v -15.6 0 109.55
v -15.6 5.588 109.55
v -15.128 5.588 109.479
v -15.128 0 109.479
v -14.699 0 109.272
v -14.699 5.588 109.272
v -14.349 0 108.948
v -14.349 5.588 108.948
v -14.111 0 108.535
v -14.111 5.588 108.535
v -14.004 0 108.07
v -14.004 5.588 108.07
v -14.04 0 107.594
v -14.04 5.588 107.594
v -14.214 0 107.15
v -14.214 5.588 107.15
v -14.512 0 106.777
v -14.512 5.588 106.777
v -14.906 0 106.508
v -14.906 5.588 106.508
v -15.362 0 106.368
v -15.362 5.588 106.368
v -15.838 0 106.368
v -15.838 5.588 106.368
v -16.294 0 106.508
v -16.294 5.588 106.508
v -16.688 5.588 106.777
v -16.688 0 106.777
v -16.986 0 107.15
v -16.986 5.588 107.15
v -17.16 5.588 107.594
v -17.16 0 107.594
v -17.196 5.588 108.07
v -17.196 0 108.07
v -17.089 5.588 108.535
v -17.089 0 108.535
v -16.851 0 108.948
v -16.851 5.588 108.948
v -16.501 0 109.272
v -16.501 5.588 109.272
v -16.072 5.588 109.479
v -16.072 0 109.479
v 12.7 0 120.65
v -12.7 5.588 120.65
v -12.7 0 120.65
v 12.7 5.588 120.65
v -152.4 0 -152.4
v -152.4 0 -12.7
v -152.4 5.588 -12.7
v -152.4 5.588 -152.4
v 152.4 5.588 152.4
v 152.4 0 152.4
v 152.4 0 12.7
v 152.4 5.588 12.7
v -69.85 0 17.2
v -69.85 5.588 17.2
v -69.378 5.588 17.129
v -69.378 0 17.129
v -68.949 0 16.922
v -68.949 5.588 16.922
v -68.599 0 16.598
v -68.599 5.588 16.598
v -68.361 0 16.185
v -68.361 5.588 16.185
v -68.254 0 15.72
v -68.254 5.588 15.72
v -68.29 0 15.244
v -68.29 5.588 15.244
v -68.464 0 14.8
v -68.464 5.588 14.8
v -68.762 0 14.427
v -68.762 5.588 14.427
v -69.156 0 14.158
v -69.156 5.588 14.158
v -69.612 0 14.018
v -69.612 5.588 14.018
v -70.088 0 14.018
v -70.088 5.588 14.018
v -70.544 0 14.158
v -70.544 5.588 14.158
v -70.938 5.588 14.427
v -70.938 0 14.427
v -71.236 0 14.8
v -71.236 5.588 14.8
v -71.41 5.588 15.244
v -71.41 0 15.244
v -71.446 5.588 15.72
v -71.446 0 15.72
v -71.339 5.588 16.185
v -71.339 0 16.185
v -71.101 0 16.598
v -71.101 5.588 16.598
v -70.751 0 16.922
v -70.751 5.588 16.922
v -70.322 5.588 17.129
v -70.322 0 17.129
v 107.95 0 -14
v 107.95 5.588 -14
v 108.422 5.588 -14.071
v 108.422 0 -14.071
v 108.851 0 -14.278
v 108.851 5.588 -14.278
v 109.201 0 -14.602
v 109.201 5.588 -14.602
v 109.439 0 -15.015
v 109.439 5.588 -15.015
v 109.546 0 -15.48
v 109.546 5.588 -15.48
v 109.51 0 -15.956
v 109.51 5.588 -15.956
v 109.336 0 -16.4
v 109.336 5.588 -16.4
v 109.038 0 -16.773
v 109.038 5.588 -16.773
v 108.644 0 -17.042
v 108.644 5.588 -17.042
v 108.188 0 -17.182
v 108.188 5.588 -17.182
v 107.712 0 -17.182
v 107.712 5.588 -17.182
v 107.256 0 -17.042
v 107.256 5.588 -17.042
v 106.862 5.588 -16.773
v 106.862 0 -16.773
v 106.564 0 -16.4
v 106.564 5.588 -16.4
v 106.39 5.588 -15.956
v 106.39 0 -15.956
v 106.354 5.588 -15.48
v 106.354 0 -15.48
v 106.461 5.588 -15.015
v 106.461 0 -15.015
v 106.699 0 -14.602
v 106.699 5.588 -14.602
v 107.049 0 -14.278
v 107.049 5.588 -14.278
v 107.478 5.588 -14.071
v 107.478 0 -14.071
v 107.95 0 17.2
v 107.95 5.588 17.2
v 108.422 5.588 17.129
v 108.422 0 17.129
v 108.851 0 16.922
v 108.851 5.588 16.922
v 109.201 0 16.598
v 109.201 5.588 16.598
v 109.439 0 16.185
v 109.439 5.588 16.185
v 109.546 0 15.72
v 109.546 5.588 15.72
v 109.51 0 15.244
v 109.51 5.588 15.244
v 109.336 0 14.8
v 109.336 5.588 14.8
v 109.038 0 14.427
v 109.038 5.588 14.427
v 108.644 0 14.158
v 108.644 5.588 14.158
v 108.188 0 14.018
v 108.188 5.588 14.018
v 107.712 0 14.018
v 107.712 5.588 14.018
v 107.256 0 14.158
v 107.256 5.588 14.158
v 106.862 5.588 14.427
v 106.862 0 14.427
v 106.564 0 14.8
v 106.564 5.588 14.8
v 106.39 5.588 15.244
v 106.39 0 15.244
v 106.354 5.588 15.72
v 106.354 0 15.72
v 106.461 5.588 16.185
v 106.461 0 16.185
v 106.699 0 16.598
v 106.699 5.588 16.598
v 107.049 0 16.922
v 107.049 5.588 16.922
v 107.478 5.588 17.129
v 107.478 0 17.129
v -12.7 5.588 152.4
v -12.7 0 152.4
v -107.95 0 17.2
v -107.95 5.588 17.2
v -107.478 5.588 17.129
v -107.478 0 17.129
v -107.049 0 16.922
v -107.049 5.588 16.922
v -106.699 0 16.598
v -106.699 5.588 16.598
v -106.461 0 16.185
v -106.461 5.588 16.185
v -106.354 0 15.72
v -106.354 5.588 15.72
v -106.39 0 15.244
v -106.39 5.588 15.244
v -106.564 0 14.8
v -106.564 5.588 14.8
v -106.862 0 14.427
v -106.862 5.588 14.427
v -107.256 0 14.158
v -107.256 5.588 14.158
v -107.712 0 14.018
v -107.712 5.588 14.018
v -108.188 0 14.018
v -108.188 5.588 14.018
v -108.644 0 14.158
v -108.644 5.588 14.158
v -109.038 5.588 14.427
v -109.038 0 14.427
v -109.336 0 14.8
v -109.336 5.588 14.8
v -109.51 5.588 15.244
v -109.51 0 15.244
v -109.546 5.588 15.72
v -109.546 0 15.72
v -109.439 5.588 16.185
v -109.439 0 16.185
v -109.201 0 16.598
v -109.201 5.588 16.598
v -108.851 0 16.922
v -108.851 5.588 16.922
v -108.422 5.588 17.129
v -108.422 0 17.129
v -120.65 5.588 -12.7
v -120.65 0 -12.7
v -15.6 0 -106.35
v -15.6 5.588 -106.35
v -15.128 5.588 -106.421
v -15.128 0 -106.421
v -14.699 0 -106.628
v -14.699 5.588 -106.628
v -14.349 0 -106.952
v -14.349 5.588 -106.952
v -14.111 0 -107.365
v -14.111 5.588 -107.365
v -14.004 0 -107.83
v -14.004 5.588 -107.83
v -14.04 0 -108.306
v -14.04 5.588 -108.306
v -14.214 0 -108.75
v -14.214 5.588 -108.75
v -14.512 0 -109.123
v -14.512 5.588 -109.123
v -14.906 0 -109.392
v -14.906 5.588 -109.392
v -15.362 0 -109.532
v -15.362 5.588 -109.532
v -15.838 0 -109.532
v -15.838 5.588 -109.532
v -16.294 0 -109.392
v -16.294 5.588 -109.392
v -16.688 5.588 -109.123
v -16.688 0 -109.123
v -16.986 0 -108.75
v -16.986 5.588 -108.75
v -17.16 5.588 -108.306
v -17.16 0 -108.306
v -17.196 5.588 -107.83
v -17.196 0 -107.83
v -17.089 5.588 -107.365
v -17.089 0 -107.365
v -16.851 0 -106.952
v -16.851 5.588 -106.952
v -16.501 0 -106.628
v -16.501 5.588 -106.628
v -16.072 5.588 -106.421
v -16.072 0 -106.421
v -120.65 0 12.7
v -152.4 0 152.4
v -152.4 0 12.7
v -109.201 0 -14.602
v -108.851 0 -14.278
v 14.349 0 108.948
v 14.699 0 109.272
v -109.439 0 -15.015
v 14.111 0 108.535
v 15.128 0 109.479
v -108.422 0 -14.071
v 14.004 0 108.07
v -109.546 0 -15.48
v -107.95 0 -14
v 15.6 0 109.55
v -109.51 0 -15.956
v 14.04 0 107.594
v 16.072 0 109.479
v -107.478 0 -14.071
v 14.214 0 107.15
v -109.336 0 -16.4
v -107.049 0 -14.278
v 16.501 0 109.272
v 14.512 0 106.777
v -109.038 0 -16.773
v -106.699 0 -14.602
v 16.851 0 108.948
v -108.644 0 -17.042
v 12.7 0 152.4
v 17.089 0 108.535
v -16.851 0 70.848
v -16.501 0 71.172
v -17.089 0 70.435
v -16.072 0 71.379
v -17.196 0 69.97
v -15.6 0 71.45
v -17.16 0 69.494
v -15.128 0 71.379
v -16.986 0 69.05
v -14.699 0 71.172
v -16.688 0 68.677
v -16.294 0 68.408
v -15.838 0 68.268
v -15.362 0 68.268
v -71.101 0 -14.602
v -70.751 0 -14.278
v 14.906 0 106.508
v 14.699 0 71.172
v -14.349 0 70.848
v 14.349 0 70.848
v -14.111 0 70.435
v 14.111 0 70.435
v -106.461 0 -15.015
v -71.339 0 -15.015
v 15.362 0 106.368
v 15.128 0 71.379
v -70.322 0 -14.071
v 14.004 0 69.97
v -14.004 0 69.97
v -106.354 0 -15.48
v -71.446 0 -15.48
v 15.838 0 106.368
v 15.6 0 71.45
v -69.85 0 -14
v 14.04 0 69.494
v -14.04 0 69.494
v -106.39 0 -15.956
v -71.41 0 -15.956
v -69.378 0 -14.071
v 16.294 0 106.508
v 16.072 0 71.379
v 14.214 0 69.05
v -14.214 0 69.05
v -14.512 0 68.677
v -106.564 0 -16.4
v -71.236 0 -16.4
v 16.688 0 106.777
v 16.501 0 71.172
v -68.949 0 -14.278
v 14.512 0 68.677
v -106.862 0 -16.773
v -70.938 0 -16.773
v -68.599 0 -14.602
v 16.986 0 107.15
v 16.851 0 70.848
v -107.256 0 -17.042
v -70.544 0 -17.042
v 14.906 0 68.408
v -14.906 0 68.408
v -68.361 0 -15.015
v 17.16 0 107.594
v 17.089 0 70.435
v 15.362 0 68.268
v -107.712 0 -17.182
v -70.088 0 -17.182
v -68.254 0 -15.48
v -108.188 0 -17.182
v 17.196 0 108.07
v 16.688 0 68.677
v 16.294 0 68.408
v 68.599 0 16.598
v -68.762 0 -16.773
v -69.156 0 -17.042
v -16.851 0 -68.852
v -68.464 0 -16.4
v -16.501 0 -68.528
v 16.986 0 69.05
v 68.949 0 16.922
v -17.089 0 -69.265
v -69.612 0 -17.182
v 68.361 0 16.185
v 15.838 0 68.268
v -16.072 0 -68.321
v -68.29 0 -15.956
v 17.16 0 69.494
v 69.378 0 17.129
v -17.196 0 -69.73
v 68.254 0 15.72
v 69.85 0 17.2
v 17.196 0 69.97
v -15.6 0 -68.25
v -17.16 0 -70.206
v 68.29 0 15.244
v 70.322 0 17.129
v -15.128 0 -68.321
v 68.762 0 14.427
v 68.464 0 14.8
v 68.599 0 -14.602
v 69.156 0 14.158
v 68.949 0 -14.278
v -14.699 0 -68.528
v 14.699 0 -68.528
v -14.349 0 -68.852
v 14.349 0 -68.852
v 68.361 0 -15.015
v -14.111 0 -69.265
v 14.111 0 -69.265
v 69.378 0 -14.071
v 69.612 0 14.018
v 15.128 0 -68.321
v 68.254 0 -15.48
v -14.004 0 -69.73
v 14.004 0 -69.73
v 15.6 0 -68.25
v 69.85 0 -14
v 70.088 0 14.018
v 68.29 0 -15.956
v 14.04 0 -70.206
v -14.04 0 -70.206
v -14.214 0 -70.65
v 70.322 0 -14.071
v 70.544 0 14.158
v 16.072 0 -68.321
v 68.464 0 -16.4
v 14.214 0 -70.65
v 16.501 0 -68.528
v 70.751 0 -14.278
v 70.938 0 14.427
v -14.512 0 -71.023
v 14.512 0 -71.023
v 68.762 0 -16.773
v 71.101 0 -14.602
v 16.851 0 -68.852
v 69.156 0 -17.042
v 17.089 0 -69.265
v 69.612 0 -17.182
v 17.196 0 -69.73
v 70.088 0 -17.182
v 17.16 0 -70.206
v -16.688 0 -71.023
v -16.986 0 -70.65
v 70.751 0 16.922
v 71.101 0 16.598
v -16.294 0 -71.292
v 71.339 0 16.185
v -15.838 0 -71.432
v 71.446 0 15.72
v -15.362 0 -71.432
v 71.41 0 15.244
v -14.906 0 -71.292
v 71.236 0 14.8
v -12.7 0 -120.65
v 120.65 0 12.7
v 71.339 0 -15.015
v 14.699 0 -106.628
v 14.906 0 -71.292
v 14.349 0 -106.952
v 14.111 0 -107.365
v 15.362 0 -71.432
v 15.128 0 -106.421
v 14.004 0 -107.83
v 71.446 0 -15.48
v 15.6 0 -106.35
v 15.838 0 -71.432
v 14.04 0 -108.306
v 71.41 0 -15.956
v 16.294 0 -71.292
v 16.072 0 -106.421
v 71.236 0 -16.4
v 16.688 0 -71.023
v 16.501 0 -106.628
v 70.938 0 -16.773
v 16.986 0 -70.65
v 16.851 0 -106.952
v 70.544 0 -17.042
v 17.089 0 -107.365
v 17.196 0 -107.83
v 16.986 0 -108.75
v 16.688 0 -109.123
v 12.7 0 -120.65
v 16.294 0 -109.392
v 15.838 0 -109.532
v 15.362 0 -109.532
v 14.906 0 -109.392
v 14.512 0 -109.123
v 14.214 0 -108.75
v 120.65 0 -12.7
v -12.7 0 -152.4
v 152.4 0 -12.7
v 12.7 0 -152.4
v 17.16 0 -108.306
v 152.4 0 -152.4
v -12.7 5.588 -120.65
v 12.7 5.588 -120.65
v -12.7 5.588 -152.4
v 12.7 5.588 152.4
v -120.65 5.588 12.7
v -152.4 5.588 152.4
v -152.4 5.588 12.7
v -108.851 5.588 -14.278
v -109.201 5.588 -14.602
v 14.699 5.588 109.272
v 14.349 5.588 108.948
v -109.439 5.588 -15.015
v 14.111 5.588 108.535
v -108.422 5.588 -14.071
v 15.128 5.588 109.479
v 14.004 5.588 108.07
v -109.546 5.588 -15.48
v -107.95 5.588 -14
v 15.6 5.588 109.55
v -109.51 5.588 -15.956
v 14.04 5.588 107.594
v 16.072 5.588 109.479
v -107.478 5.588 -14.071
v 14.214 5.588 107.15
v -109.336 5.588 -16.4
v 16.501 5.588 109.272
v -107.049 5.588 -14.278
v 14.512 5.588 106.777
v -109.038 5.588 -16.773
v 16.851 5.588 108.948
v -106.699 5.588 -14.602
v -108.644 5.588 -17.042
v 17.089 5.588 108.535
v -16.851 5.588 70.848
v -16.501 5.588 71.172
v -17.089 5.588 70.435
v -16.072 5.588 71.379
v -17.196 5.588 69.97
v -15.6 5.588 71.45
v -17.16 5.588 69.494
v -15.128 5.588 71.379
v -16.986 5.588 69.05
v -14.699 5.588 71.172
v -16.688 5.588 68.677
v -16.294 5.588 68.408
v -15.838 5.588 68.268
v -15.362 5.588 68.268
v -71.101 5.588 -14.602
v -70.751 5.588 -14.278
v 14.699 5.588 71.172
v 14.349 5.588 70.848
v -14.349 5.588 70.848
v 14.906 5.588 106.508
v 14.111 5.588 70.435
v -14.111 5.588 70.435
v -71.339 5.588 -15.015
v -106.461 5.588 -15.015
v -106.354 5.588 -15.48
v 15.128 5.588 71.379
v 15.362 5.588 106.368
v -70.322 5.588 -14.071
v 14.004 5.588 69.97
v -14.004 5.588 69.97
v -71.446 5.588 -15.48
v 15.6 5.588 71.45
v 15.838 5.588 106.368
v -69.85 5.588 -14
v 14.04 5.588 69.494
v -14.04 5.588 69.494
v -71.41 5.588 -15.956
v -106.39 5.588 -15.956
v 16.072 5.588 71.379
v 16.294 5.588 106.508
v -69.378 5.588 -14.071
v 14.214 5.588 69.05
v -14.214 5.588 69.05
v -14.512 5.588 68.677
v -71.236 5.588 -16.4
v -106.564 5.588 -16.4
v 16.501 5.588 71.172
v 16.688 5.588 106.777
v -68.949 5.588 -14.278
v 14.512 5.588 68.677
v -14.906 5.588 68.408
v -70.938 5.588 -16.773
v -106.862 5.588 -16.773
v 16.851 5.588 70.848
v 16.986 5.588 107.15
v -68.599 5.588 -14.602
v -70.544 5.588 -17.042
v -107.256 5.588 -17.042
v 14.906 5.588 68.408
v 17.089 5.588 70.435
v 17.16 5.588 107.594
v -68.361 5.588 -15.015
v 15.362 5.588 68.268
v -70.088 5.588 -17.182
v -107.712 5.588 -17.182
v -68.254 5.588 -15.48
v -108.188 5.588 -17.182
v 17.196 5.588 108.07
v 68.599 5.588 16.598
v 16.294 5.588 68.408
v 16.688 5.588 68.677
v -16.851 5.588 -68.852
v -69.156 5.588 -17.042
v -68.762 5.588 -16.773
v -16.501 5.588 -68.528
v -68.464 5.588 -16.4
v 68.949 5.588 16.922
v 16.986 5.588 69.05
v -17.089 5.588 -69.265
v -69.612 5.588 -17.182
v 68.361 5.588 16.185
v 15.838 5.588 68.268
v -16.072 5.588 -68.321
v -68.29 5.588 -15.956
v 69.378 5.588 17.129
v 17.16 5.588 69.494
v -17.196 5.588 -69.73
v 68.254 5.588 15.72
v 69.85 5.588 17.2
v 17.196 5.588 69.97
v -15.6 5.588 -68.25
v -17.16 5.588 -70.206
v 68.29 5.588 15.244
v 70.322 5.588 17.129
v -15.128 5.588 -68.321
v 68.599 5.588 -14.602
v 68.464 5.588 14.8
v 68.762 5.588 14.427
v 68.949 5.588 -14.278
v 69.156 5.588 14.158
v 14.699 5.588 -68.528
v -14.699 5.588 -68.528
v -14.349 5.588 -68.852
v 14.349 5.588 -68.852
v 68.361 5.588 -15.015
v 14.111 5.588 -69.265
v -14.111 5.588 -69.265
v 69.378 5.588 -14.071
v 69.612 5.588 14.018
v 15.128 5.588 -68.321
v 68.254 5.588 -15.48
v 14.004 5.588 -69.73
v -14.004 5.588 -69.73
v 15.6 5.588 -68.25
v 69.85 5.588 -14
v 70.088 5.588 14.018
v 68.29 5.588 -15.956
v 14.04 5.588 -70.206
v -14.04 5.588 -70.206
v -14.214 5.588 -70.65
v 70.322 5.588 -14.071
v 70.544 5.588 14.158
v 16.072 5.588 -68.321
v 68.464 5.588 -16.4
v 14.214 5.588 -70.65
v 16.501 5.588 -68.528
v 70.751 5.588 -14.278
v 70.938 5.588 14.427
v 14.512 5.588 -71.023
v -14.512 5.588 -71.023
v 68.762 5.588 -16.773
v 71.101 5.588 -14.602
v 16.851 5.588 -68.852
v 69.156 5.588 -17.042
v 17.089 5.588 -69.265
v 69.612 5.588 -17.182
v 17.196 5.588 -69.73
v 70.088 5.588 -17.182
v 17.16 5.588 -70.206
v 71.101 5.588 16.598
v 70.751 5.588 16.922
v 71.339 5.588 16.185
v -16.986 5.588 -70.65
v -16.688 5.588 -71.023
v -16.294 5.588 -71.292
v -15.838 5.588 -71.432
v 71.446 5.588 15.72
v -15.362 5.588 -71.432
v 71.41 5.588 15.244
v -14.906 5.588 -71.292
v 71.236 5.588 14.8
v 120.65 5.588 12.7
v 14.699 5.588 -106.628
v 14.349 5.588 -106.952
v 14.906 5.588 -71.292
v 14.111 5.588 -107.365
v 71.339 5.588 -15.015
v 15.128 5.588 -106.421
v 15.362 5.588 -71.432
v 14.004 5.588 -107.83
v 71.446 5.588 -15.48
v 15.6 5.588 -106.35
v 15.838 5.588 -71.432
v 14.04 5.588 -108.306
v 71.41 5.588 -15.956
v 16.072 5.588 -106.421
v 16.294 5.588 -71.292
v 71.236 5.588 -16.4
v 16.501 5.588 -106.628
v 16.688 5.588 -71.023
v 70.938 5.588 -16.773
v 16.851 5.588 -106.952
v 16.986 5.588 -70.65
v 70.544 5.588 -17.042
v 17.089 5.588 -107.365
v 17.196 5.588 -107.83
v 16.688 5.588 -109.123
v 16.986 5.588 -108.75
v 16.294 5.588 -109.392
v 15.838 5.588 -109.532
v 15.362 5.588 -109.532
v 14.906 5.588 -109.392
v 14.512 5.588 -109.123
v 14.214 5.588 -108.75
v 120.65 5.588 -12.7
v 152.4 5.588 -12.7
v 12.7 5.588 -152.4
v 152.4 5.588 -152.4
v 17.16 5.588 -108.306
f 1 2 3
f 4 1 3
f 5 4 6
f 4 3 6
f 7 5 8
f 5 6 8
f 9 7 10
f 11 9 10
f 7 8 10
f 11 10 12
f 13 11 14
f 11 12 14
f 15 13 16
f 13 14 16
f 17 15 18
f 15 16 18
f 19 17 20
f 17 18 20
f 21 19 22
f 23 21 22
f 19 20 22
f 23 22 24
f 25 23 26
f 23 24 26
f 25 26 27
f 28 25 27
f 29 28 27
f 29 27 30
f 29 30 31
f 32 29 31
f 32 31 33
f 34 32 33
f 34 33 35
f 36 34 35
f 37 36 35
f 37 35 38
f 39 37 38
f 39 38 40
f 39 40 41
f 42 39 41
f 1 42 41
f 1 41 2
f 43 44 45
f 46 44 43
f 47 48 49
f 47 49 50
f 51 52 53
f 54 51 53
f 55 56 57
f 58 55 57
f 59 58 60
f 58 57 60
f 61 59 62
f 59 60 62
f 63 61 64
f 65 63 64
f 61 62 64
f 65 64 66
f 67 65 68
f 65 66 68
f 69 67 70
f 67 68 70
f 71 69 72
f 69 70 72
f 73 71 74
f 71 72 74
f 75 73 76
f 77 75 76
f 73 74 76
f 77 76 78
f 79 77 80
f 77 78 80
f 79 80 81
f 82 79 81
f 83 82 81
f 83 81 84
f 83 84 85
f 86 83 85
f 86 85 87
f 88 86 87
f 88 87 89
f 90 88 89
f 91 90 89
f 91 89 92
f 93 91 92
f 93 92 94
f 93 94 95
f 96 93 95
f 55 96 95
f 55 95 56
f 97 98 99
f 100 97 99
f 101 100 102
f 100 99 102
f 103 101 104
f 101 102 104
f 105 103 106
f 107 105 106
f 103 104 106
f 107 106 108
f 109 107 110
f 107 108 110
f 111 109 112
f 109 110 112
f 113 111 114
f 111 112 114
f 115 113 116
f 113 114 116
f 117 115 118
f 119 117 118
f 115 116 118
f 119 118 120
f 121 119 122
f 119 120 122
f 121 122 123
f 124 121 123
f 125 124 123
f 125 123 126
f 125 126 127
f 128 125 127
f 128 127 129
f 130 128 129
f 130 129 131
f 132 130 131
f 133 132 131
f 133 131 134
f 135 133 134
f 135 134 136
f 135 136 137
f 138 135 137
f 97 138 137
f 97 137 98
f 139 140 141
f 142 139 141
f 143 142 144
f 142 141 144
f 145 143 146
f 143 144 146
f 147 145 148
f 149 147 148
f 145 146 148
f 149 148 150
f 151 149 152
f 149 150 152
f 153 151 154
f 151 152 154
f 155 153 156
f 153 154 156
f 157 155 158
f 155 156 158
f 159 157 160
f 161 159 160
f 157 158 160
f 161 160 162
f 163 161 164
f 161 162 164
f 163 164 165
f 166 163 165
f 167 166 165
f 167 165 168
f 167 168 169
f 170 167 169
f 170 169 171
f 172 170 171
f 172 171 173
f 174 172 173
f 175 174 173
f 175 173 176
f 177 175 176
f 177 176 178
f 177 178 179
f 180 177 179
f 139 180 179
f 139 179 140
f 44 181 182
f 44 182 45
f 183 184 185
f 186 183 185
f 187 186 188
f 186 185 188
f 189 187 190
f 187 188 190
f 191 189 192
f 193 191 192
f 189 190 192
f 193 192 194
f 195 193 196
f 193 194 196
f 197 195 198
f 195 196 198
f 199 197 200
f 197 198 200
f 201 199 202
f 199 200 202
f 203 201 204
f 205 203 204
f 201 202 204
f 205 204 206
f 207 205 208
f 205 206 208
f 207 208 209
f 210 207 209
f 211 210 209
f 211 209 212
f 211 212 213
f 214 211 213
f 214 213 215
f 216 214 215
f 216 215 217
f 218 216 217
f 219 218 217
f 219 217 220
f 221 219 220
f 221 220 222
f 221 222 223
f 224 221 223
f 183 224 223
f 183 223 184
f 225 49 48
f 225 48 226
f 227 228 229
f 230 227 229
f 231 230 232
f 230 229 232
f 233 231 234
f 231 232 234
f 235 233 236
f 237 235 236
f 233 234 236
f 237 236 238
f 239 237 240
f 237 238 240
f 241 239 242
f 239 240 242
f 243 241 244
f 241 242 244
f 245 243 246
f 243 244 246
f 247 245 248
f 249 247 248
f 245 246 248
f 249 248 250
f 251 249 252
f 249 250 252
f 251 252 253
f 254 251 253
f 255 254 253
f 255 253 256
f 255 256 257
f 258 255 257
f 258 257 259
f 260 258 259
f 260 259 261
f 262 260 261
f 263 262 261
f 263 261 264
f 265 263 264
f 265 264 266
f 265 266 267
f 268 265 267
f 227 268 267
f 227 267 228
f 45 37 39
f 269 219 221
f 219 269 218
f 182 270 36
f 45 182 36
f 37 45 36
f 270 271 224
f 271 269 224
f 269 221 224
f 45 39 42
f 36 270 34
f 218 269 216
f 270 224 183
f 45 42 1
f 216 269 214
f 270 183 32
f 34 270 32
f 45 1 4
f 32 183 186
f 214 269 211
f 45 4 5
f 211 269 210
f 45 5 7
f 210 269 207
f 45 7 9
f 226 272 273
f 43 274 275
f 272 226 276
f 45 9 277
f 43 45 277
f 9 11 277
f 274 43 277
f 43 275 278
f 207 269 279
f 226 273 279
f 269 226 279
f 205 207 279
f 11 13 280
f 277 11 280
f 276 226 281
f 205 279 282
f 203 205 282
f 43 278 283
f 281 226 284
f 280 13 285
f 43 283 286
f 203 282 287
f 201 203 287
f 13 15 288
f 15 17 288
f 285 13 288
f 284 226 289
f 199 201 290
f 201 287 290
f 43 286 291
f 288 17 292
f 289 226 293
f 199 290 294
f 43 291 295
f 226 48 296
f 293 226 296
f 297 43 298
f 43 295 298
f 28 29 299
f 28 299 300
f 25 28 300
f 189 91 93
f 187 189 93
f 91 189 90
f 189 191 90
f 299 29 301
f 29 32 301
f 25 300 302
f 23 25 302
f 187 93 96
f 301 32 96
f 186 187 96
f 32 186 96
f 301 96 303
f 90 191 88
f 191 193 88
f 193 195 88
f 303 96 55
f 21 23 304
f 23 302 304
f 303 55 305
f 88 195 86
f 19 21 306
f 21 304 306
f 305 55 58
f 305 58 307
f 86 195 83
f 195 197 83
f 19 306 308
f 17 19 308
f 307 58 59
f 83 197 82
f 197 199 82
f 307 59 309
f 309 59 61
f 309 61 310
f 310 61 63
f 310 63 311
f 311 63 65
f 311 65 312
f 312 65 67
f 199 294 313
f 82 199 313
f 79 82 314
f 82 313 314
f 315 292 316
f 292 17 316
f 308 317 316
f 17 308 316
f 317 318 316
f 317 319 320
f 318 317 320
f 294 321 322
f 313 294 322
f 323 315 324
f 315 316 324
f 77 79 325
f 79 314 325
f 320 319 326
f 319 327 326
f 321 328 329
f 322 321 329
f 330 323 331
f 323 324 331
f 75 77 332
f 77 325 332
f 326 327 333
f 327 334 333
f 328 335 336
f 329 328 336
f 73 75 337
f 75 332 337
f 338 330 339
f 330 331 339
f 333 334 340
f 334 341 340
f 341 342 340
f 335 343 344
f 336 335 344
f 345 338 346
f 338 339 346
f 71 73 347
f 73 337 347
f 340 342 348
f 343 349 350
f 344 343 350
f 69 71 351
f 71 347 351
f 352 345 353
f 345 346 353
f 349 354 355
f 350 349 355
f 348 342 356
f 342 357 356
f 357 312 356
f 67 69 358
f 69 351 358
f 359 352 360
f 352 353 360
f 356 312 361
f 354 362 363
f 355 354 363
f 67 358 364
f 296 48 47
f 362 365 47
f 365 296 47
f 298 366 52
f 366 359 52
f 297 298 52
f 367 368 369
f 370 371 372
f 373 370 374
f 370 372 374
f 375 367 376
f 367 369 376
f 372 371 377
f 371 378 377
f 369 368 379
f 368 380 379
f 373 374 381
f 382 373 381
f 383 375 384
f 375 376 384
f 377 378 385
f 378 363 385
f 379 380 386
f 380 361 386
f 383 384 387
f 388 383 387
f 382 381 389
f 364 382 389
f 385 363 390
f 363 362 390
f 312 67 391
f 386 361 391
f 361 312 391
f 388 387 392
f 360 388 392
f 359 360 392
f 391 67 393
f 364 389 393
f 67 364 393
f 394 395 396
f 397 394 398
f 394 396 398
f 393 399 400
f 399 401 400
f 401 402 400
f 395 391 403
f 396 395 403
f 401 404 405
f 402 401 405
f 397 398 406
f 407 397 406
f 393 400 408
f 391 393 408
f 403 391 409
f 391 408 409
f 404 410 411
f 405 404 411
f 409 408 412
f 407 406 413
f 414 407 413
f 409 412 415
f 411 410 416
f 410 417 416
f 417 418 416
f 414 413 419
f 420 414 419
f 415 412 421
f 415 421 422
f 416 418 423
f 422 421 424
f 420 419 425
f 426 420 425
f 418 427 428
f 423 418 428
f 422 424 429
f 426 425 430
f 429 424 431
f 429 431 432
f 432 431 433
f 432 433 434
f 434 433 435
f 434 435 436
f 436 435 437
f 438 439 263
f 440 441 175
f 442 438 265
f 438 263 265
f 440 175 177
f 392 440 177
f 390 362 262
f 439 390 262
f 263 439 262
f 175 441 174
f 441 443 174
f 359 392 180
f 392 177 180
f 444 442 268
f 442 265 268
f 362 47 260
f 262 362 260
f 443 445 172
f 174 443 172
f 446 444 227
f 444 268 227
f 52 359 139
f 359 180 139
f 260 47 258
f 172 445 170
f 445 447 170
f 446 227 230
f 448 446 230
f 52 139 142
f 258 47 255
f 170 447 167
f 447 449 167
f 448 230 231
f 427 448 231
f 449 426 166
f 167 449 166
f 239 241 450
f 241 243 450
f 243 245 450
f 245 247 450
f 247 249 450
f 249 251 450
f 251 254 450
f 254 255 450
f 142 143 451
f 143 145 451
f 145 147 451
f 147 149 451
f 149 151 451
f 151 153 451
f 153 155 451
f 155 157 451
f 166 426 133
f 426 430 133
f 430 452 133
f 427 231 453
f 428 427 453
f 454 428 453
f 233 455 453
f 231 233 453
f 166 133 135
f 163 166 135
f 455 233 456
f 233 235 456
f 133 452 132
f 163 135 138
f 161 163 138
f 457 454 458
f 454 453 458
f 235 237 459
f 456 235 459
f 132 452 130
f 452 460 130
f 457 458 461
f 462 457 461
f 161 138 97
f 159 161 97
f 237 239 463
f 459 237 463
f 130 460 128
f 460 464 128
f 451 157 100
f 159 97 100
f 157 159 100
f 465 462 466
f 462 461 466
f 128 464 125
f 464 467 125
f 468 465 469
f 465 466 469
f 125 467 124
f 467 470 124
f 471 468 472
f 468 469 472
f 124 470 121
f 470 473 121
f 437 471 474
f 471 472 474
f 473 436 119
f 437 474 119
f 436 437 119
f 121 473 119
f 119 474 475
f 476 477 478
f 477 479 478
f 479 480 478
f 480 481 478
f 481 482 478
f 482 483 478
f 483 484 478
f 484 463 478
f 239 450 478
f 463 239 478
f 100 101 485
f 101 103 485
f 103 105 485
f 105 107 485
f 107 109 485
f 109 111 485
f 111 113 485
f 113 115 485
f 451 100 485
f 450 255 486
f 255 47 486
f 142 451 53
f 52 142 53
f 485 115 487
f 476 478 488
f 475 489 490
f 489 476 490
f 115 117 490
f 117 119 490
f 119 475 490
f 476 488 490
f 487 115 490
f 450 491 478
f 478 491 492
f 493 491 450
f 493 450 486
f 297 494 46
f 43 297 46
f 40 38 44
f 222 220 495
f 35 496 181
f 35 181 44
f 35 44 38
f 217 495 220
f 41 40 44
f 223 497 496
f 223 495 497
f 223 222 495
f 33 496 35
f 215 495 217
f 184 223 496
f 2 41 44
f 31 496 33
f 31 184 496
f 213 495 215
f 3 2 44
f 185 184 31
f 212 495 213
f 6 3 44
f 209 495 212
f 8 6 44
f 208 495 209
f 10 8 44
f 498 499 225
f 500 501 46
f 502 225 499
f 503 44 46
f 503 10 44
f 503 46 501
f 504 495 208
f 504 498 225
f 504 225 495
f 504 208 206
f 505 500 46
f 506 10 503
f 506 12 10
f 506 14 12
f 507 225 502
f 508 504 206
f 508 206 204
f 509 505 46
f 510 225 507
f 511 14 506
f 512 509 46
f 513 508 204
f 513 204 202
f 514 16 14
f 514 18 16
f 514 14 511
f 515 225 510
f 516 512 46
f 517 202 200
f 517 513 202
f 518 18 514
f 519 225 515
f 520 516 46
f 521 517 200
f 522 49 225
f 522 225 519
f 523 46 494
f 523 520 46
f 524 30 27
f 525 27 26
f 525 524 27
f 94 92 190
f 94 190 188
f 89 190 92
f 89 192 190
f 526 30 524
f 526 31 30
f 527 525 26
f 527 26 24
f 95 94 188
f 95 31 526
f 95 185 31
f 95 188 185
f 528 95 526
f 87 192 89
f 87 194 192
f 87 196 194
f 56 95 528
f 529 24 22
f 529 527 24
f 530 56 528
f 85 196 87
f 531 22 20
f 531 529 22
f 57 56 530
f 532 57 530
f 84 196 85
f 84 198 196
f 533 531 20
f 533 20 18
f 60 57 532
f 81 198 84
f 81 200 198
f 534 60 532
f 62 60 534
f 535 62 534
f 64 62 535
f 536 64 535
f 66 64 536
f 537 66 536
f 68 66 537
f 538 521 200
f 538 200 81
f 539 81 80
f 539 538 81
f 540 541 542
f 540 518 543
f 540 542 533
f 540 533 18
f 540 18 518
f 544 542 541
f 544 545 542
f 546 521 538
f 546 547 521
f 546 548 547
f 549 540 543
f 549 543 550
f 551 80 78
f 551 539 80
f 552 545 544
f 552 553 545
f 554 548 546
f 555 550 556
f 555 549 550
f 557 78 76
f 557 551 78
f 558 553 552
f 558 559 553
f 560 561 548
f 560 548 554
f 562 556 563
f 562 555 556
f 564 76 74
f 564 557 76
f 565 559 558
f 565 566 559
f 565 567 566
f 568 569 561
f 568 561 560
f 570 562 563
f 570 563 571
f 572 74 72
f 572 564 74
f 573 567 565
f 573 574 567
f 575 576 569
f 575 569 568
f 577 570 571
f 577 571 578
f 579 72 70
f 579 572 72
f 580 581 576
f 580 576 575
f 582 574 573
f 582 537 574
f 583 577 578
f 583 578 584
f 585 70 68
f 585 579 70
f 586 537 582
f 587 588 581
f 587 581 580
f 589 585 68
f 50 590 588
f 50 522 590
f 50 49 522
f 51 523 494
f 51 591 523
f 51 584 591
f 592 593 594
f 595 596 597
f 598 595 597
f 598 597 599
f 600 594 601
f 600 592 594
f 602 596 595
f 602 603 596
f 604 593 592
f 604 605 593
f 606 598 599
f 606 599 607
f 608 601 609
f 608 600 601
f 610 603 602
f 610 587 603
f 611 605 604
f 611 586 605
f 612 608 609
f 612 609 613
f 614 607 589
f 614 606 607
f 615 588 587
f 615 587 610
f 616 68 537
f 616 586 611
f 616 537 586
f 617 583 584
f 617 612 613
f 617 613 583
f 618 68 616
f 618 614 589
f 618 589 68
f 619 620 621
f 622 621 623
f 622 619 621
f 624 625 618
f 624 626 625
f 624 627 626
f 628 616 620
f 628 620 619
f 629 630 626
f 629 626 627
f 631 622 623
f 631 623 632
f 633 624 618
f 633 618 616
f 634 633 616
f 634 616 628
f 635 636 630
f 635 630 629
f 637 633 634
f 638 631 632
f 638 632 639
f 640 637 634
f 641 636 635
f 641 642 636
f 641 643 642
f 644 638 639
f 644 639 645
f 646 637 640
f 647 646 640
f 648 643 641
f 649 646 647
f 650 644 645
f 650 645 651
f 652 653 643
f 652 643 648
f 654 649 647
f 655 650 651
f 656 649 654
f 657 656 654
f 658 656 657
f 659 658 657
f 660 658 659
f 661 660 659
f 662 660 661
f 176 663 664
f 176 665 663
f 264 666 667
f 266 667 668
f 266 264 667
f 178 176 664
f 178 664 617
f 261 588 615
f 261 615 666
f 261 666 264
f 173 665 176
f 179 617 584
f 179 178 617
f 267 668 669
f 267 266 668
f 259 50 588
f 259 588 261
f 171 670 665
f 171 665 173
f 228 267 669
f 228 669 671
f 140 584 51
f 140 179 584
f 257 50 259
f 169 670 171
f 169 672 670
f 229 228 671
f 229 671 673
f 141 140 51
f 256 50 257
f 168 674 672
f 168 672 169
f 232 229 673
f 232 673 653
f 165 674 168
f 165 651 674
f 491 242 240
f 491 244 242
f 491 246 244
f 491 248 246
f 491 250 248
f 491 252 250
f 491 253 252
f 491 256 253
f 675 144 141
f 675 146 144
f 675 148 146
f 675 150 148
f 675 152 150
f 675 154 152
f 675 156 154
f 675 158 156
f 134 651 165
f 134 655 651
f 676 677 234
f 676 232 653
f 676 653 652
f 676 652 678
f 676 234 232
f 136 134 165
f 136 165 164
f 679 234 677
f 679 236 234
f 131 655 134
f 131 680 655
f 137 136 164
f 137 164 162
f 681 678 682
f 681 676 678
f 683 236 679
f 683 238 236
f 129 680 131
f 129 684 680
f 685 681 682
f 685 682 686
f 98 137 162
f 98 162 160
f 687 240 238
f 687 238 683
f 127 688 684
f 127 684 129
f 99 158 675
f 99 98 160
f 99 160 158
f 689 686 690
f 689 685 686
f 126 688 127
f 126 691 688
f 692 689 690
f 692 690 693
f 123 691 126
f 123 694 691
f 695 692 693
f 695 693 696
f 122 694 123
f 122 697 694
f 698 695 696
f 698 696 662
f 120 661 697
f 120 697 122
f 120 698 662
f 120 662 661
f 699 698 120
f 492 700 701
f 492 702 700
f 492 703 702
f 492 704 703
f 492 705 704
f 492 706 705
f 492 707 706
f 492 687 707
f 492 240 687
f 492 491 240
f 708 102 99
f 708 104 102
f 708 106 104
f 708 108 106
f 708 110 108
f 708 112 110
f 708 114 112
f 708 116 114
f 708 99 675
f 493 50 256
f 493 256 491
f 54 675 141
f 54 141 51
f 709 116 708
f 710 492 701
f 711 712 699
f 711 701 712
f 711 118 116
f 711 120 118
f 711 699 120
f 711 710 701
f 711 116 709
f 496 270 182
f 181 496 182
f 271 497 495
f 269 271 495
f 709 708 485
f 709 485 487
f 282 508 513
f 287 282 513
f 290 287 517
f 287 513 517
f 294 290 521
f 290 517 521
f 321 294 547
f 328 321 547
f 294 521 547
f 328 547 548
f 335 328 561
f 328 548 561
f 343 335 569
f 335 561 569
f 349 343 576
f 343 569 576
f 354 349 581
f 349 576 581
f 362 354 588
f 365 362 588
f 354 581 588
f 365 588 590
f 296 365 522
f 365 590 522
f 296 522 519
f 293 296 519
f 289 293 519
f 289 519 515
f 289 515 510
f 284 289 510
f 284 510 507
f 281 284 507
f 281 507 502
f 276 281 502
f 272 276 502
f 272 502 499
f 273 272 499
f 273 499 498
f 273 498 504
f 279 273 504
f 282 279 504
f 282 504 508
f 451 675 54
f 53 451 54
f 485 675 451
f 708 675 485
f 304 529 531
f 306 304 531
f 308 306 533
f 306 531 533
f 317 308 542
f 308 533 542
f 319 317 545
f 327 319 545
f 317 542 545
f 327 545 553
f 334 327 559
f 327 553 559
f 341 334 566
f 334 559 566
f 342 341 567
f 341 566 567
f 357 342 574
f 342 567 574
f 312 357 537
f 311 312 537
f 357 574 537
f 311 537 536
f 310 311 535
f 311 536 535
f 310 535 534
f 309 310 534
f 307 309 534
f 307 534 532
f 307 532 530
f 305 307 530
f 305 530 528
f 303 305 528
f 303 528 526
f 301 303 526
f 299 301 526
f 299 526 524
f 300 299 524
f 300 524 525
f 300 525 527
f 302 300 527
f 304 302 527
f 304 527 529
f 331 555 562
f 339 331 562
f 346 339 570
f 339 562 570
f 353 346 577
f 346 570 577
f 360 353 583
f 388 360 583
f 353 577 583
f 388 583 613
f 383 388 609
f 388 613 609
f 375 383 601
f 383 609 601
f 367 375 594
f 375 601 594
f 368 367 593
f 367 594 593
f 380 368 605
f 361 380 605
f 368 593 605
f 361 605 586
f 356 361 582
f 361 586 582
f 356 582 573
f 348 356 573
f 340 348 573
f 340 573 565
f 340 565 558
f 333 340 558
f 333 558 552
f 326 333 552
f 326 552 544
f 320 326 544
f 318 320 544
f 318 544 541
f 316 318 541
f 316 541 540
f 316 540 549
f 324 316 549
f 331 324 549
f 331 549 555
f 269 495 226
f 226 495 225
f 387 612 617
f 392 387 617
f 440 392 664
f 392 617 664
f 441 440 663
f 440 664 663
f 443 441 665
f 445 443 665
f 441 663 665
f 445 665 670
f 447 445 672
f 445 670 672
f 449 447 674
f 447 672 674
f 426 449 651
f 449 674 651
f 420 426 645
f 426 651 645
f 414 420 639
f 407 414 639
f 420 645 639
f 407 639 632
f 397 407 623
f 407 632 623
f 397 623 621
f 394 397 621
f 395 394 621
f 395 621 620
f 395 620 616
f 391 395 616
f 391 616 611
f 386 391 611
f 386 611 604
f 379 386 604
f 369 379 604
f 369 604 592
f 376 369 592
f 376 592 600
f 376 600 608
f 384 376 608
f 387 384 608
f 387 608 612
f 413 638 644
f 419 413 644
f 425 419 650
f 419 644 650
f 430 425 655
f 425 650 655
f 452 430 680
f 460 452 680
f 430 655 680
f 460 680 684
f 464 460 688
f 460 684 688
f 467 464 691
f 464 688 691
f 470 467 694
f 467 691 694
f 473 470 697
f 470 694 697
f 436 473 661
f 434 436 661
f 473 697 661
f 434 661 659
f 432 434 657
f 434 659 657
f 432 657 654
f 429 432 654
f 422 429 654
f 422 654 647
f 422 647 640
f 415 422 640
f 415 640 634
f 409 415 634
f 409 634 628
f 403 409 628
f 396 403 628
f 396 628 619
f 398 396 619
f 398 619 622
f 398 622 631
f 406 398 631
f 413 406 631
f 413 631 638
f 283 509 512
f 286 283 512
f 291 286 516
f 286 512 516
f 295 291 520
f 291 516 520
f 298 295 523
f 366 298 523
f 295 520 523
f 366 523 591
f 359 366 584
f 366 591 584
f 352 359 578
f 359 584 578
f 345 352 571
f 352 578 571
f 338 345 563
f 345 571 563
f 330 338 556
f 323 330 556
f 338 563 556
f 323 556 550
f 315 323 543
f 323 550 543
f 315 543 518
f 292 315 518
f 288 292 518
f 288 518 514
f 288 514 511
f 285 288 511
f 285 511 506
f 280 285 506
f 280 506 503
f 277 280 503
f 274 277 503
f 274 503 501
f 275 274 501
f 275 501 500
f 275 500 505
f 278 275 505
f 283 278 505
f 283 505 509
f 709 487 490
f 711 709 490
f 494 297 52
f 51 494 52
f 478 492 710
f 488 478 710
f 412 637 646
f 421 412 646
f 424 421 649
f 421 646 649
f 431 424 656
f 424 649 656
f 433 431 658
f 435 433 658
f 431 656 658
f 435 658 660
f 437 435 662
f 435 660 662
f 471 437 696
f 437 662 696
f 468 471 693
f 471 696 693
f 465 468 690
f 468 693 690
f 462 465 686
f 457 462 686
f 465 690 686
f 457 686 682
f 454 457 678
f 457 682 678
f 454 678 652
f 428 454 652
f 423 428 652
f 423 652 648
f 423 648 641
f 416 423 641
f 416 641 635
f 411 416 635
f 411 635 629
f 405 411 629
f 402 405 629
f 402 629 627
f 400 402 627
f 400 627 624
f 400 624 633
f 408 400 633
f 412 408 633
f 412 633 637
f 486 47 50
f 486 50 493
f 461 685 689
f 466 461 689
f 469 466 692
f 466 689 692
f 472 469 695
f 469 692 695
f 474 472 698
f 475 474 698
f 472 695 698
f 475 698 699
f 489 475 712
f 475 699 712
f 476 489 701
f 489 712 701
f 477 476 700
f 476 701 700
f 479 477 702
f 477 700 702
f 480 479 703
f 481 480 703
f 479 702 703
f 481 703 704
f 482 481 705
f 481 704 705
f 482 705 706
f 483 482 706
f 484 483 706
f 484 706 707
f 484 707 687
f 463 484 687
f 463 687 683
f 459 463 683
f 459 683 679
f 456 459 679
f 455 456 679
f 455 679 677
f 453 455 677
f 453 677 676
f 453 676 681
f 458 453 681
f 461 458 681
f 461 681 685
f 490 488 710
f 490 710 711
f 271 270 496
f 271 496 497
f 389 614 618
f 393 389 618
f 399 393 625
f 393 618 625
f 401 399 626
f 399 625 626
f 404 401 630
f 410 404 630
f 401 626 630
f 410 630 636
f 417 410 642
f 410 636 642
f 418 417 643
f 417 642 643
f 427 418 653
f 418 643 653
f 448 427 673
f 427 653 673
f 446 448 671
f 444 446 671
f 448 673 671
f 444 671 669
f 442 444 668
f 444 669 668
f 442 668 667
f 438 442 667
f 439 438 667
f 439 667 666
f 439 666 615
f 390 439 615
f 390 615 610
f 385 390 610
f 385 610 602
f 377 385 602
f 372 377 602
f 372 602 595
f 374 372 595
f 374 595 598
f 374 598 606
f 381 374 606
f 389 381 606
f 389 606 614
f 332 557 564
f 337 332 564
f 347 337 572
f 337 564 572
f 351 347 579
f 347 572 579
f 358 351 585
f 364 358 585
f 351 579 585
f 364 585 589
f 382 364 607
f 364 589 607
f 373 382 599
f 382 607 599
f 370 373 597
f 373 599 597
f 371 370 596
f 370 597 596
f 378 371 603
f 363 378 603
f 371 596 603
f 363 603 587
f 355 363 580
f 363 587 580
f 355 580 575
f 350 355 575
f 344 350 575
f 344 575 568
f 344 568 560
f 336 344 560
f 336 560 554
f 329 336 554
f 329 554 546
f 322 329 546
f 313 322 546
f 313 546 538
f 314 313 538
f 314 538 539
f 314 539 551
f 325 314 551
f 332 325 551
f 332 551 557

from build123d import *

# Parameters (mm, degrees)
SKETCH1_W           = 304.8
SKETCH1_H           = 304.8
BOSS_EXTRUDE1_DEPTH = 5.588
SKETCH2_R           = 1.6
SKETCH2_W           = 31.75
SKETCH2_H           = 25.4
SKETCH2_W_2         = 25.4
SKETCH2_H_2         = 31.75
CUT_EXTRUDE1_DEPTH  = 216.598575468


with BuildPart() as part:
    # Sketch1 → Boss-Extrude1 (new body)
    with BuildSketch(Plane(origin=(0, 0, 0), x_dir=(1, 0, 0), z_dir=(0, 1, 0))):
        Rectangle(SKETCH1_W, SKETCH1_H)
    extrude(amount=BOSS_EXTRUDE1_DEPTH)

    # Sketch2 → Cut-Extrude1 (cut, through all)
    with BuildSketch(Plane(origin=(0, 5.588, 0), x_dir=(1, 0, 0), z_dir=(0, 1, 0))):
        with Locations(Location((-107.95, 15.6, 0), (0, 0, 270))):
            Circle(SKETCH2_R)
        with Locations(Location((-69.85, 15.6, 0), (0, 0, 270))):
            Circle(SKETCH2_R)
        with Locations(Location((-107.95, -15.6, 0), (0, 0, 270))):
            Circle(SKETCH2_R)
        with Locations(Location((-69.85, -15.6, 0), (0, 0, 270))):
            Circle(SKETCH2_R)
        with Locations(Location((-15.6, -69.85, 0), (0, 0, 270))):
            Circle(SKETCH2_R)
        with Locations(Location((15.6, -69.85, 0), (0, 0, 270))):
            Circle(SKETCH2_R)
        with Locations(Location((-15.6, -107.95, 0), (0, 0, 270))):
            Circle(SKETCH2_R)
        with Locations(Location((15.6, -107.95, 0), (0, 0, 270))):
            Circle(SKETCH2_R)
        with Locations(Location((69.85, -15.6, 0), (0, 0, 270))):
            Circle(SKETCH2_R)
        with Locations(Location((69.85, 15.6, 0), (0, 0, 270))):
            Circle(SKETCH2_R)
        with Locations(Location((107.95, 15.6, 0), (0, 0, 270))):
            Circle(SKETCH2_R)
        with Locations(Location((107.95, -15.6, 0), (0, 0, 270))):
            Circle(SKETCH2_R)
        with Locations(Location((-15.6, 69.85, 0), (0, 0, 270))):
            Circle(SKETCH2_R)
        with Locations(Location((-15.6, 107.95, 0), (0, 0, 270))):
            Circle(SKETCH2_R)
        with Locations(Location((15.6, 107.95, 0), (0, 0, 270))):
            Circle(SKETCH2_R)
        with Locations(Location((15.6, 69.85, 0), (0, 0, 270))):
            Circle(SKETCH2_R)
        with Locations((-136.525, 0)):
            Rectangle(SKETCH2_W, SKETCH2_H)
        with Locations((0, 136.525)):
            Rectangle(SKETCH2_W_2, SKETCH2_H_2)
        with Locations((136.525, 0)):
            Rectangle(SKETCH2_W, SKETCH2_H)
        with Locations((0, -136.525)):
            Rectangle(SKETCH2_W_2, SKETCH2_H_2)
    extrude(amount=-CUT_EXTRUDE1_DEPTH, mode=Mode.SUBTRACT)


solid = part.part
